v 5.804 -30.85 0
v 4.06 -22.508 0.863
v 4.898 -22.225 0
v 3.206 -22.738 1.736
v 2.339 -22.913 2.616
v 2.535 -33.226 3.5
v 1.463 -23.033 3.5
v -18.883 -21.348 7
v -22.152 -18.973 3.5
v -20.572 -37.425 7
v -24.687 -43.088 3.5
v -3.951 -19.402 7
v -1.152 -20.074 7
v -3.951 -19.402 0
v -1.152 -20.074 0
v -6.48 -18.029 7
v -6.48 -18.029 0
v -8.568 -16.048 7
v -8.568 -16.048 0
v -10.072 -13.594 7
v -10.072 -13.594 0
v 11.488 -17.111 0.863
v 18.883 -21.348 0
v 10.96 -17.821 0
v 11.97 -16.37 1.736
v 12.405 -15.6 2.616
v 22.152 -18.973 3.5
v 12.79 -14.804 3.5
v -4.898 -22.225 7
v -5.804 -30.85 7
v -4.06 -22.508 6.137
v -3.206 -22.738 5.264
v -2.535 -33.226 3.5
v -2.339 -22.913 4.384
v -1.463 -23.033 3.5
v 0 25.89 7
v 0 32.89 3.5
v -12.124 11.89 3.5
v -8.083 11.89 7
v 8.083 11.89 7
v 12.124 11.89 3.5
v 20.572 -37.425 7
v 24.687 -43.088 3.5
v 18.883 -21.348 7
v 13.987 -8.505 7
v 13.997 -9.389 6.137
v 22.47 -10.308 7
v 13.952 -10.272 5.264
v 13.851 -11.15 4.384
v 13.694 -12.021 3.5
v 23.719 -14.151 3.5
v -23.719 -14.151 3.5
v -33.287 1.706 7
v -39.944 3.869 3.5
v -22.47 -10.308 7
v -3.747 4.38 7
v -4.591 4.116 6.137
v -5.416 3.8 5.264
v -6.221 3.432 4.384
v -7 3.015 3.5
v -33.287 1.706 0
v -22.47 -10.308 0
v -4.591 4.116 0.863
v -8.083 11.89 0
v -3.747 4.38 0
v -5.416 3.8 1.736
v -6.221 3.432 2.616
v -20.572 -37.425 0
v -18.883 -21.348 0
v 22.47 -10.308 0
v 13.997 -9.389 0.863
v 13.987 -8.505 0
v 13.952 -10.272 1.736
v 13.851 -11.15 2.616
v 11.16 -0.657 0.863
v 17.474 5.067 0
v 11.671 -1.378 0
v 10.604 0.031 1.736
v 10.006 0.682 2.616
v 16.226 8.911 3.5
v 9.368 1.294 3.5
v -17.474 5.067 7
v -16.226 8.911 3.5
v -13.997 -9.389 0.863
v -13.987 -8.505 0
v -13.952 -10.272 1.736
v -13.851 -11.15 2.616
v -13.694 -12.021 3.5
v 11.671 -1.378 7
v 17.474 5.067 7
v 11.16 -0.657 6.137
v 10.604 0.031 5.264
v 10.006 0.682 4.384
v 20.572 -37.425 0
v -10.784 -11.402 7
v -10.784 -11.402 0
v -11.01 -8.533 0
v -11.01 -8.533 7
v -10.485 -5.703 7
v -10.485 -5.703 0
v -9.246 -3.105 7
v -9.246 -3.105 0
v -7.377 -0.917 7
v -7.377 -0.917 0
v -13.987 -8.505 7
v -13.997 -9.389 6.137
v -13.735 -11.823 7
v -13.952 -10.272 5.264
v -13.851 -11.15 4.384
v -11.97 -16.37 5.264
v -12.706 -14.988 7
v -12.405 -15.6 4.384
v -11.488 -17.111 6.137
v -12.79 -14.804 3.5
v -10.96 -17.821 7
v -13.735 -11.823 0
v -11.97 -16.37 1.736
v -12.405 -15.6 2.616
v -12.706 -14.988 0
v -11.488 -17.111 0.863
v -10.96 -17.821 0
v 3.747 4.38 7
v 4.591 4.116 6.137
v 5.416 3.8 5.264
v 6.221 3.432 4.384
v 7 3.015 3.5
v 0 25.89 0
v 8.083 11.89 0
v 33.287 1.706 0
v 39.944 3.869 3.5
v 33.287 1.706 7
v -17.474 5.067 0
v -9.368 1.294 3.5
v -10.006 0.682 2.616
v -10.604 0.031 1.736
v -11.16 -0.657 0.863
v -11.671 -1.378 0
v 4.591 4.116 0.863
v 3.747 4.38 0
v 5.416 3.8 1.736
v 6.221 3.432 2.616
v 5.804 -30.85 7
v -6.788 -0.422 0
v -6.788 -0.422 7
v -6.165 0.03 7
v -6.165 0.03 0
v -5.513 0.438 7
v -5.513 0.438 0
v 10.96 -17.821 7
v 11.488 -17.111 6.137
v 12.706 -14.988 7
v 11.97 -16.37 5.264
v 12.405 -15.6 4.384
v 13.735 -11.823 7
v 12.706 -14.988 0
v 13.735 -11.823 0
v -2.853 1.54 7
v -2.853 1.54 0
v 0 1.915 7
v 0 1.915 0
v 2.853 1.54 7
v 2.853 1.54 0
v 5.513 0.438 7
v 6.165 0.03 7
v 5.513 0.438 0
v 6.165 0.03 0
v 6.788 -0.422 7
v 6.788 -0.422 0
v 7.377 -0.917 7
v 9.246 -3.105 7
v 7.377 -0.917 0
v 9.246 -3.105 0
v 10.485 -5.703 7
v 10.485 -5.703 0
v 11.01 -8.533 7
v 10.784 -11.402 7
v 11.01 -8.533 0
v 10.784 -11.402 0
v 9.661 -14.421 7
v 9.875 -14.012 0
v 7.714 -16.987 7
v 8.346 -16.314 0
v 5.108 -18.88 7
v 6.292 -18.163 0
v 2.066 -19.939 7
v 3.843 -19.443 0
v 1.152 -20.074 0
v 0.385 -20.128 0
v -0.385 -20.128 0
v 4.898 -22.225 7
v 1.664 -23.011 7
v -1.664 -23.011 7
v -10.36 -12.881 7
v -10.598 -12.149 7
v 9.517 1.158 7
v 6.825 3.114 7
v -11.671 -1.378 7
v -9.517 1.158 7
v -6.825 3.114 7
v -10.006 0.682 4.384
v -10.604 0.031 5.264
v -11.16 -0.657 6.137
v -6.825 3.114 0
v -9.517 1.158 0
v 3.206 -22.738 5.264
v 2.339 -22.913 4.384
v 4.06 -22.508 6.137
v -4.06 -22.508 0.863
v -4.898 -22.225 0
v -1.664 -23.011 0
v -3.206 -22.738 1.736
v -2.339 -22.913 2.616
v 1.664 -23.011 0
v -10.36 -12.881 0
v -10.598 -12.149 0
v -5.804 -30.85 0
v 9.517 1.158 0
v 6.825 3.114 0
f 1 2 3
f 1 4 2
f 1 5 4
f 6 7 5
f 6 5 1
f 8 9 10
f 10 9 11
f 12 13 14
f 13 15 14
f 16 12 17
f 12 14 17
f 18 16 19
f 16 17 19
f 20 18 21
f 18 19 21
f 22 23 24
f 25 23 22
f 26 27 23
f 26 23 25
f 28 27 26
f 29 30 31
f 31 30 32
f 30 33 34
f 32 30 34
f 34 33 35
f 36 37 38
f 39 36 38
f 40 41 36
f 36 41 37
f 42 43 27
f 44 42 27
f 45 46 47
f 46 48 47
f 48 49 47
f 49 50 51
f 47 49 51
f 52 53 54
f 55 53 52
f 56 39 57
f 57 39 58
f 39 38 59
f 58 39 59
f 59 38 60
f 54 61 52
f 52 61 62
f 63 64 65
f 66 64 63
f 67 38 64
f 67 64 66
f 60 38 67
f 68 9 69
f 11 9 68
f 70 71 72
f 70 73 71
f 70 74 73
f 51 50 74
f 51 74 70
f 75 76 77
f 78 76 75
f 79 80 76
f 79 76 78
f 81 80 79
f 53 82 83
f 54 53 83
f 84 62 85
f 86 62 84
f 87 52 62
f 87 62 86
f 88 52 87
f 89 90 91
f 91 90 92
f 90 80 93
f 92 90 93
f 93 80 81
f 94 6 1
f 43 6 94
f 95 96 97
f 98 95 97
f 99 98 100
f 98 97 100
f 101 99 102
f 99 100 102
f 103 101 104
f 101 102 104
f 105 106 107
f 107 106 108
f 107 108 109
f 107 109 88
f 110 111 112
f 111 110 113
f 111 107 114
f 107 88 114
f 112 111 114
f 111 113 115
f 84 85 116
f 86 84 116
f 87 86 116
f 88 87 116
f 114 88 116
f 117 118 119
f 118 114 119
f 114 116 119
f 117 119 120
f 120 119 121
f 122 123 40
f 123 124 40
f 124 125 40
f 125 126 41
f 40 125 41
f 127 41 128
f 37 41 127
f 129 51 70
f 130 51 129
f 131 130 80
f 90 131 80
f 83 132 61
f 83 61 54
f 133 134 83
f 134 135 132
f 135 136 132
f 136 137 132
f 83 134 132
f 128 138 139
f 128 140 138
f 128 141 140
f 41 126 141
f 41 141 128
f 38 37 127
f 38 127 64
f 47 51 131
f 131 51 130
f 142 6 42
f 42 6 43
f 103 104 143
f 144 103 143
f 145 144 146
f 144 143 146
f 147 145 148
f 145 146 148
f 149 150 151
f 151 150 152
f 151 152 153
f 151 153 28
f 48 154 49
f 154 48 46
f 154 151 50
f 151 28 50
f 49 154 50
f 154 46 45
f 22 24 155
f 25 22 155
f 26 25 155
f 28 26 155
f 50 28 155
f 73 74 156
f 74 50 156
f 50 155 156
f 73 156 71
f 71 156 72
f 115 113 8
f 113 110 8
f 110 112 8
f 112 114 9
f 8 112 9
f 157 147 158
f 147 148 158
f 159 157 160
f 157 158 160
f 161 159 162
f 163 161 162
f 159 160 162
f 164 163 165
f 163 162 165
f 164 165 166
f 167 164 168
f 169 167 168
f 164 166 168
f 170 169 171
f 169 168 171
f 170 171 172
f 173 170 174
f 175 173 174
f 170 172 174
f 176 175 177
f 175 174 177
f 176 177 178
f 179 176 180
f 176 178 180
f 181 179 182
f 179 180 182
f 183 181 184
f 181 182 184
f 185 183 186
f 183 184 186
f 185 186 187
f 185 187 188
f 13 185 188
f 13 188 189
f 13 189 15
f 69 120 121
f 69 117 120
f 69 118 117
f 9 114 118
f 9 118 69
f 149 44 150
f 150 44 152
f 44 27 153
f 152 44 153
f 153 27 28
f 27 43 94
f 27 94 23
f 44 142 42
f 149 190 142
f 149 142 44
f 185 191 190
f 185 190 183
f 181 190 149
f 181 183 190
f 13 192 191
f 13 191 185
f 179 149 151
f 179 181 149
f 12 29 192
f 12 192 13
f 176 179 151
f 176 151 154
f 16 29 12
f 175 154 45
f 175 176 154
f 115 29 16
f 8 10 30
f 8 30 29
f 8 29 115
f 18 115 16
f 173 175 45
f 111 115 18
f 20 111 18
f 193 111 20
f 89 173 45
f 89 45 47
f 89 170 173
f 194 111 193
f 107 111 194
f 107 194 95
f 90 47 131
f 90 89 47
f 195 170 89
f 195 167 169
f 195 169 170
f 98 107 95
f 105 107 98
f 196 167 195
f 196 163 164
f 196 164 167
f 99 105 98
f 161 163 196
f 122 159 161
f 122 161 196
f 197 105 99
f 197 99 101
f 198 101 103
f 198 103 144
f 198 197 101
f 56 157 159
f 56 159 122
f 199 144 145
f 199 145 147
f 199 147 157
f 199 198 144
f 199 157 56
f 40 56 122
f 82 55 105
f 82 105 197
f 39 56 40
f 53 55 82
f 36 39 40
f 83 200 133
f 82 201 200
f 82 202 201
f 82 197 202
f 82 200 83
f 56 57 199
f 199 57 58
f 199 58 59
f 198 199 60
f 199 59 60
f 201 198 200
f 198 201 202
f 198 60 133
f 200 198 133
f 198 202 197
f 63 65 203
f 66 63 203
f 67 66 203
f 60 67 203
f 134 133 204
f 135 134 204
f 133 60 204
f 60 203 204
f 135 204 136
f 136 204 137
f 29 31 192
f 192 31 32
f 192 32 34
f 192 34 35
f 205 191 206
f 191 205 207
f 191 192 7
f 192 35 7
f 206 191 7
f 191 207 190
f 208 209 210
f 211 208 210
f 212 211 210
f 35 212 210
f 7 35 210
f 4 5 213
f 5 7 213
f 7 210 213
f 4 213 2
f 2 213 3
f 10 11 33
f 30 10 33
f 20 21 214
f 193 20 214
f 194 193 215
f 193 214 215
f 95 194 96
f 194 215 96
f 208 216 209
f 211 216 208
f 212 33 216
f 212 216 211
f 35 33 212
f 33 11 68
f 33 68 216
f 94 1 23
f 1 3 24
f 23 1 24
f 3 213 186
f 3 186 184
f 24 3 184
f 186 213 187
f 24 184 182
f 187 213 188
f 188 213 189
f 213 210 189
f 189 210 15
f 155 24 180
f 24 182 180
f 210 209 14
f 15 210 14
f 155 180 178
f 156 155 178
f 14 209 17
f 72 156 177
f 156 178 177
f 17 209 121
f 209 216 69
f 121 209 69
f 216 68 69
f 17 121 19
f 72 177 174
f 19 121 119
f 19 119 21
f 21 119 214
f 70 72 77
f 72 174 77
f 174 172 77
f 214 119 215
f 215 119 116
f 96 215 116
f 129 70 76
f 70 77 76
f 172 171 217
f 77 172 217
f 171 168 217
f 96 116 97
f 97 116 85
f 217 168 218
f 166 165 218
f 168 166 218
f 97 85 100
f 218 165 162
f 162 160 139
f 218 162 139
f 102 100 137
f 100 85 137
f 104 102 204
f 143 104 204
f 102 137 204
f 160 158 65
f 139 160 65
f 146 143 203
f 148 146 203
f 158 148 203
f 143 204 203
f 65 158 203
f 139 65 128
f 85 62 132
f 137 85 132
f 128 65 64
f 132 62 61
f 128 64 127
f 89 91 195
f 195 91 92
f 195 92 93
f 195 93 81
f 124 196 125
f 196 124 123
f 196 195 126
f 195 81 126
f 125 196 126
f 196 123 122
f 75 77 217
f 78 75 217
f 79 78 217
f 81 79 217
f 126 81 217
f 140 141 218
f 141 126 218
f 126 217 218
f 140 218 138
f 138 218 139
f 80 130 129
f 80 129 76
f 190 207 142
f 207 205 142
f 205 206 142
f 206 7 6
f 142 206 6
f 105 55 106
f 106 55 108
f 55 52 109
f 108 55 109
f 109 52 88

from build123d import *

# Parameters (mm, degrees)
F1_DEPTH = 7
F2_COUNT = 5
F3_SIZE  = 3.49999


# Not quite as in the source:
# - a fillet or chamfer is up to 0.001 mm smaller than in the source, because OpenCascade refuses the exact size


with BuildPart() as f1:
    # F0 (on Top) → F1 (new body)
    with BuildSketch(Plane.XY):
        Polygon((-12.124355653, 11.8902331595), (12.124355653, 11.8902331595), (0, 32.8902331595), align=None)
        with BuildLine():
            Line((7, 3.0145888124), (12.124355653, 11.8902331595))
            Line((12.124355653, 11.8902331595), (-12.124355653, 11.8902331595))
            Line((-12.124355653, 11.8902331595), (-7, 3.0145888124))
            ThreePointArc((-7, 3.0145888124), (0, 4.8902331595), (7, 3.0145888124))
        make_face()
        with BuildLine():
            Line((5.5125, 0.4381632362), (7, 3.0145888124))
            ThreePointArc((7, 3.0145888124), (0, 4.8902331595), (-7, 3.0145888124))
            Line((-7, 3.0145888124), (-5.5125, 0.4381632362))
            ThreePointArc((-5.5125, 0.4381632362), (0, 1.9152331595), (5.5125, 0.4381632362))
        make_face()
        with BuildLine():
            ThreePointArc((14, -9.1097668405), (12.124355653, -2.1097668405), (7, 3.0145888124))
            Line((7, 3.0145888124), (5.5125, 0.4381632362))
            ThreePointArc((5.5125, 0.4381632362), (9.5479300767, -3.5972668405), (11.025, -9.1097668405))
            ThreePointArc((11.025, -9.1097668405), (-5.5125, -18.6576969173), (-5.5125, 0.4381632362))
            Line((-5.5125, 0.4381632362), (-7, 3.0145888124))
            ThreePointArc((-7, 3.0145888124), (-7, -21.2341224935), (14, -9.1097668405))
        make_face()
    extrude(amount=F1_DEPTH)

    # F2: F1 ×5 about axis
    f2_axis = Axis((0, -9.1097668405, 0), (0, 0, -1))


with BuildPart() as f1_1:
    add(f1.part)
    for i in range(1, F2_COUNT):
        add(f1.part.rotate(f2_axis, i * 360 / F2_COUNT))

    # F3 (size 3.5 in the source; OpenCascade refuses exactly that, so slightly less here)
    f3_edges = [f1_1.edges().sort_by_distance(p)[0] for p in [
        (-13.610831, -38.157061, 7),
        (-23.41964, -31.030543, 7),
        (-18.706443, -13.085944, 7),
        (-17.470968, -16.888343, 7),
        (-31.831596, -5.141205, 7),
        (-28.084964, 6.389742, 7),
        (-9.562178, 7.452411, 7),
        (-12.796692, 5.102399, 7),
        (-6.062178, 22.390233, 7),
        (6.062178, 22.390233, 7),
        (9.562178, 7.452411, 7),
        (12.796692, 5.102399, 7),
        (28.084964, 6.389742, 7),
        (31.831596, -5.141205, 7),
        (18.706443, -13.085944, 7),
        (17.470968, -16.888343, 7),
        (23.41964, -31.030543, 7),
        (13.610831, -38.157061, 7),
        (1.99904, -28.129357, 7),
        (-1.99904, -28.129357, 7),
        (-13.610831, -38.157061, 0),
        (-23.41964, -31.030543, 0),
        (-1.99904, -28.129357, 0),
        (1.99904, -28.129357, 0),
        (13.610831, -38.157061, 0),
        (23.41964, -31.030543, 0),
        (17.470968, -16.888343, 0),
        (18.706443, -13.085944, 0),
        (31.831596, -5.141205, 0),
        (28.084964, 6.389742, 0),
        (12.796692, 5.102399, 0),
        (9.562178, 7.452411, 0),
        (6.062178, 22.390233, 0),
        (-6.062178, 22.390233, 0),
        (-9.562178, 7.452411, 0),
        (-12.796692, 5.102399, 0),
        (-28.084964, 6.389742, 0),
        (-31.831596, -5.141205, 0),
        (-18.706443, -13.085944, 0),
        (-17.470968, -16.888343, 0),
    ]]
    chamfer(f3_edges, length=F3_SIZE)


solid = f1_1.part
